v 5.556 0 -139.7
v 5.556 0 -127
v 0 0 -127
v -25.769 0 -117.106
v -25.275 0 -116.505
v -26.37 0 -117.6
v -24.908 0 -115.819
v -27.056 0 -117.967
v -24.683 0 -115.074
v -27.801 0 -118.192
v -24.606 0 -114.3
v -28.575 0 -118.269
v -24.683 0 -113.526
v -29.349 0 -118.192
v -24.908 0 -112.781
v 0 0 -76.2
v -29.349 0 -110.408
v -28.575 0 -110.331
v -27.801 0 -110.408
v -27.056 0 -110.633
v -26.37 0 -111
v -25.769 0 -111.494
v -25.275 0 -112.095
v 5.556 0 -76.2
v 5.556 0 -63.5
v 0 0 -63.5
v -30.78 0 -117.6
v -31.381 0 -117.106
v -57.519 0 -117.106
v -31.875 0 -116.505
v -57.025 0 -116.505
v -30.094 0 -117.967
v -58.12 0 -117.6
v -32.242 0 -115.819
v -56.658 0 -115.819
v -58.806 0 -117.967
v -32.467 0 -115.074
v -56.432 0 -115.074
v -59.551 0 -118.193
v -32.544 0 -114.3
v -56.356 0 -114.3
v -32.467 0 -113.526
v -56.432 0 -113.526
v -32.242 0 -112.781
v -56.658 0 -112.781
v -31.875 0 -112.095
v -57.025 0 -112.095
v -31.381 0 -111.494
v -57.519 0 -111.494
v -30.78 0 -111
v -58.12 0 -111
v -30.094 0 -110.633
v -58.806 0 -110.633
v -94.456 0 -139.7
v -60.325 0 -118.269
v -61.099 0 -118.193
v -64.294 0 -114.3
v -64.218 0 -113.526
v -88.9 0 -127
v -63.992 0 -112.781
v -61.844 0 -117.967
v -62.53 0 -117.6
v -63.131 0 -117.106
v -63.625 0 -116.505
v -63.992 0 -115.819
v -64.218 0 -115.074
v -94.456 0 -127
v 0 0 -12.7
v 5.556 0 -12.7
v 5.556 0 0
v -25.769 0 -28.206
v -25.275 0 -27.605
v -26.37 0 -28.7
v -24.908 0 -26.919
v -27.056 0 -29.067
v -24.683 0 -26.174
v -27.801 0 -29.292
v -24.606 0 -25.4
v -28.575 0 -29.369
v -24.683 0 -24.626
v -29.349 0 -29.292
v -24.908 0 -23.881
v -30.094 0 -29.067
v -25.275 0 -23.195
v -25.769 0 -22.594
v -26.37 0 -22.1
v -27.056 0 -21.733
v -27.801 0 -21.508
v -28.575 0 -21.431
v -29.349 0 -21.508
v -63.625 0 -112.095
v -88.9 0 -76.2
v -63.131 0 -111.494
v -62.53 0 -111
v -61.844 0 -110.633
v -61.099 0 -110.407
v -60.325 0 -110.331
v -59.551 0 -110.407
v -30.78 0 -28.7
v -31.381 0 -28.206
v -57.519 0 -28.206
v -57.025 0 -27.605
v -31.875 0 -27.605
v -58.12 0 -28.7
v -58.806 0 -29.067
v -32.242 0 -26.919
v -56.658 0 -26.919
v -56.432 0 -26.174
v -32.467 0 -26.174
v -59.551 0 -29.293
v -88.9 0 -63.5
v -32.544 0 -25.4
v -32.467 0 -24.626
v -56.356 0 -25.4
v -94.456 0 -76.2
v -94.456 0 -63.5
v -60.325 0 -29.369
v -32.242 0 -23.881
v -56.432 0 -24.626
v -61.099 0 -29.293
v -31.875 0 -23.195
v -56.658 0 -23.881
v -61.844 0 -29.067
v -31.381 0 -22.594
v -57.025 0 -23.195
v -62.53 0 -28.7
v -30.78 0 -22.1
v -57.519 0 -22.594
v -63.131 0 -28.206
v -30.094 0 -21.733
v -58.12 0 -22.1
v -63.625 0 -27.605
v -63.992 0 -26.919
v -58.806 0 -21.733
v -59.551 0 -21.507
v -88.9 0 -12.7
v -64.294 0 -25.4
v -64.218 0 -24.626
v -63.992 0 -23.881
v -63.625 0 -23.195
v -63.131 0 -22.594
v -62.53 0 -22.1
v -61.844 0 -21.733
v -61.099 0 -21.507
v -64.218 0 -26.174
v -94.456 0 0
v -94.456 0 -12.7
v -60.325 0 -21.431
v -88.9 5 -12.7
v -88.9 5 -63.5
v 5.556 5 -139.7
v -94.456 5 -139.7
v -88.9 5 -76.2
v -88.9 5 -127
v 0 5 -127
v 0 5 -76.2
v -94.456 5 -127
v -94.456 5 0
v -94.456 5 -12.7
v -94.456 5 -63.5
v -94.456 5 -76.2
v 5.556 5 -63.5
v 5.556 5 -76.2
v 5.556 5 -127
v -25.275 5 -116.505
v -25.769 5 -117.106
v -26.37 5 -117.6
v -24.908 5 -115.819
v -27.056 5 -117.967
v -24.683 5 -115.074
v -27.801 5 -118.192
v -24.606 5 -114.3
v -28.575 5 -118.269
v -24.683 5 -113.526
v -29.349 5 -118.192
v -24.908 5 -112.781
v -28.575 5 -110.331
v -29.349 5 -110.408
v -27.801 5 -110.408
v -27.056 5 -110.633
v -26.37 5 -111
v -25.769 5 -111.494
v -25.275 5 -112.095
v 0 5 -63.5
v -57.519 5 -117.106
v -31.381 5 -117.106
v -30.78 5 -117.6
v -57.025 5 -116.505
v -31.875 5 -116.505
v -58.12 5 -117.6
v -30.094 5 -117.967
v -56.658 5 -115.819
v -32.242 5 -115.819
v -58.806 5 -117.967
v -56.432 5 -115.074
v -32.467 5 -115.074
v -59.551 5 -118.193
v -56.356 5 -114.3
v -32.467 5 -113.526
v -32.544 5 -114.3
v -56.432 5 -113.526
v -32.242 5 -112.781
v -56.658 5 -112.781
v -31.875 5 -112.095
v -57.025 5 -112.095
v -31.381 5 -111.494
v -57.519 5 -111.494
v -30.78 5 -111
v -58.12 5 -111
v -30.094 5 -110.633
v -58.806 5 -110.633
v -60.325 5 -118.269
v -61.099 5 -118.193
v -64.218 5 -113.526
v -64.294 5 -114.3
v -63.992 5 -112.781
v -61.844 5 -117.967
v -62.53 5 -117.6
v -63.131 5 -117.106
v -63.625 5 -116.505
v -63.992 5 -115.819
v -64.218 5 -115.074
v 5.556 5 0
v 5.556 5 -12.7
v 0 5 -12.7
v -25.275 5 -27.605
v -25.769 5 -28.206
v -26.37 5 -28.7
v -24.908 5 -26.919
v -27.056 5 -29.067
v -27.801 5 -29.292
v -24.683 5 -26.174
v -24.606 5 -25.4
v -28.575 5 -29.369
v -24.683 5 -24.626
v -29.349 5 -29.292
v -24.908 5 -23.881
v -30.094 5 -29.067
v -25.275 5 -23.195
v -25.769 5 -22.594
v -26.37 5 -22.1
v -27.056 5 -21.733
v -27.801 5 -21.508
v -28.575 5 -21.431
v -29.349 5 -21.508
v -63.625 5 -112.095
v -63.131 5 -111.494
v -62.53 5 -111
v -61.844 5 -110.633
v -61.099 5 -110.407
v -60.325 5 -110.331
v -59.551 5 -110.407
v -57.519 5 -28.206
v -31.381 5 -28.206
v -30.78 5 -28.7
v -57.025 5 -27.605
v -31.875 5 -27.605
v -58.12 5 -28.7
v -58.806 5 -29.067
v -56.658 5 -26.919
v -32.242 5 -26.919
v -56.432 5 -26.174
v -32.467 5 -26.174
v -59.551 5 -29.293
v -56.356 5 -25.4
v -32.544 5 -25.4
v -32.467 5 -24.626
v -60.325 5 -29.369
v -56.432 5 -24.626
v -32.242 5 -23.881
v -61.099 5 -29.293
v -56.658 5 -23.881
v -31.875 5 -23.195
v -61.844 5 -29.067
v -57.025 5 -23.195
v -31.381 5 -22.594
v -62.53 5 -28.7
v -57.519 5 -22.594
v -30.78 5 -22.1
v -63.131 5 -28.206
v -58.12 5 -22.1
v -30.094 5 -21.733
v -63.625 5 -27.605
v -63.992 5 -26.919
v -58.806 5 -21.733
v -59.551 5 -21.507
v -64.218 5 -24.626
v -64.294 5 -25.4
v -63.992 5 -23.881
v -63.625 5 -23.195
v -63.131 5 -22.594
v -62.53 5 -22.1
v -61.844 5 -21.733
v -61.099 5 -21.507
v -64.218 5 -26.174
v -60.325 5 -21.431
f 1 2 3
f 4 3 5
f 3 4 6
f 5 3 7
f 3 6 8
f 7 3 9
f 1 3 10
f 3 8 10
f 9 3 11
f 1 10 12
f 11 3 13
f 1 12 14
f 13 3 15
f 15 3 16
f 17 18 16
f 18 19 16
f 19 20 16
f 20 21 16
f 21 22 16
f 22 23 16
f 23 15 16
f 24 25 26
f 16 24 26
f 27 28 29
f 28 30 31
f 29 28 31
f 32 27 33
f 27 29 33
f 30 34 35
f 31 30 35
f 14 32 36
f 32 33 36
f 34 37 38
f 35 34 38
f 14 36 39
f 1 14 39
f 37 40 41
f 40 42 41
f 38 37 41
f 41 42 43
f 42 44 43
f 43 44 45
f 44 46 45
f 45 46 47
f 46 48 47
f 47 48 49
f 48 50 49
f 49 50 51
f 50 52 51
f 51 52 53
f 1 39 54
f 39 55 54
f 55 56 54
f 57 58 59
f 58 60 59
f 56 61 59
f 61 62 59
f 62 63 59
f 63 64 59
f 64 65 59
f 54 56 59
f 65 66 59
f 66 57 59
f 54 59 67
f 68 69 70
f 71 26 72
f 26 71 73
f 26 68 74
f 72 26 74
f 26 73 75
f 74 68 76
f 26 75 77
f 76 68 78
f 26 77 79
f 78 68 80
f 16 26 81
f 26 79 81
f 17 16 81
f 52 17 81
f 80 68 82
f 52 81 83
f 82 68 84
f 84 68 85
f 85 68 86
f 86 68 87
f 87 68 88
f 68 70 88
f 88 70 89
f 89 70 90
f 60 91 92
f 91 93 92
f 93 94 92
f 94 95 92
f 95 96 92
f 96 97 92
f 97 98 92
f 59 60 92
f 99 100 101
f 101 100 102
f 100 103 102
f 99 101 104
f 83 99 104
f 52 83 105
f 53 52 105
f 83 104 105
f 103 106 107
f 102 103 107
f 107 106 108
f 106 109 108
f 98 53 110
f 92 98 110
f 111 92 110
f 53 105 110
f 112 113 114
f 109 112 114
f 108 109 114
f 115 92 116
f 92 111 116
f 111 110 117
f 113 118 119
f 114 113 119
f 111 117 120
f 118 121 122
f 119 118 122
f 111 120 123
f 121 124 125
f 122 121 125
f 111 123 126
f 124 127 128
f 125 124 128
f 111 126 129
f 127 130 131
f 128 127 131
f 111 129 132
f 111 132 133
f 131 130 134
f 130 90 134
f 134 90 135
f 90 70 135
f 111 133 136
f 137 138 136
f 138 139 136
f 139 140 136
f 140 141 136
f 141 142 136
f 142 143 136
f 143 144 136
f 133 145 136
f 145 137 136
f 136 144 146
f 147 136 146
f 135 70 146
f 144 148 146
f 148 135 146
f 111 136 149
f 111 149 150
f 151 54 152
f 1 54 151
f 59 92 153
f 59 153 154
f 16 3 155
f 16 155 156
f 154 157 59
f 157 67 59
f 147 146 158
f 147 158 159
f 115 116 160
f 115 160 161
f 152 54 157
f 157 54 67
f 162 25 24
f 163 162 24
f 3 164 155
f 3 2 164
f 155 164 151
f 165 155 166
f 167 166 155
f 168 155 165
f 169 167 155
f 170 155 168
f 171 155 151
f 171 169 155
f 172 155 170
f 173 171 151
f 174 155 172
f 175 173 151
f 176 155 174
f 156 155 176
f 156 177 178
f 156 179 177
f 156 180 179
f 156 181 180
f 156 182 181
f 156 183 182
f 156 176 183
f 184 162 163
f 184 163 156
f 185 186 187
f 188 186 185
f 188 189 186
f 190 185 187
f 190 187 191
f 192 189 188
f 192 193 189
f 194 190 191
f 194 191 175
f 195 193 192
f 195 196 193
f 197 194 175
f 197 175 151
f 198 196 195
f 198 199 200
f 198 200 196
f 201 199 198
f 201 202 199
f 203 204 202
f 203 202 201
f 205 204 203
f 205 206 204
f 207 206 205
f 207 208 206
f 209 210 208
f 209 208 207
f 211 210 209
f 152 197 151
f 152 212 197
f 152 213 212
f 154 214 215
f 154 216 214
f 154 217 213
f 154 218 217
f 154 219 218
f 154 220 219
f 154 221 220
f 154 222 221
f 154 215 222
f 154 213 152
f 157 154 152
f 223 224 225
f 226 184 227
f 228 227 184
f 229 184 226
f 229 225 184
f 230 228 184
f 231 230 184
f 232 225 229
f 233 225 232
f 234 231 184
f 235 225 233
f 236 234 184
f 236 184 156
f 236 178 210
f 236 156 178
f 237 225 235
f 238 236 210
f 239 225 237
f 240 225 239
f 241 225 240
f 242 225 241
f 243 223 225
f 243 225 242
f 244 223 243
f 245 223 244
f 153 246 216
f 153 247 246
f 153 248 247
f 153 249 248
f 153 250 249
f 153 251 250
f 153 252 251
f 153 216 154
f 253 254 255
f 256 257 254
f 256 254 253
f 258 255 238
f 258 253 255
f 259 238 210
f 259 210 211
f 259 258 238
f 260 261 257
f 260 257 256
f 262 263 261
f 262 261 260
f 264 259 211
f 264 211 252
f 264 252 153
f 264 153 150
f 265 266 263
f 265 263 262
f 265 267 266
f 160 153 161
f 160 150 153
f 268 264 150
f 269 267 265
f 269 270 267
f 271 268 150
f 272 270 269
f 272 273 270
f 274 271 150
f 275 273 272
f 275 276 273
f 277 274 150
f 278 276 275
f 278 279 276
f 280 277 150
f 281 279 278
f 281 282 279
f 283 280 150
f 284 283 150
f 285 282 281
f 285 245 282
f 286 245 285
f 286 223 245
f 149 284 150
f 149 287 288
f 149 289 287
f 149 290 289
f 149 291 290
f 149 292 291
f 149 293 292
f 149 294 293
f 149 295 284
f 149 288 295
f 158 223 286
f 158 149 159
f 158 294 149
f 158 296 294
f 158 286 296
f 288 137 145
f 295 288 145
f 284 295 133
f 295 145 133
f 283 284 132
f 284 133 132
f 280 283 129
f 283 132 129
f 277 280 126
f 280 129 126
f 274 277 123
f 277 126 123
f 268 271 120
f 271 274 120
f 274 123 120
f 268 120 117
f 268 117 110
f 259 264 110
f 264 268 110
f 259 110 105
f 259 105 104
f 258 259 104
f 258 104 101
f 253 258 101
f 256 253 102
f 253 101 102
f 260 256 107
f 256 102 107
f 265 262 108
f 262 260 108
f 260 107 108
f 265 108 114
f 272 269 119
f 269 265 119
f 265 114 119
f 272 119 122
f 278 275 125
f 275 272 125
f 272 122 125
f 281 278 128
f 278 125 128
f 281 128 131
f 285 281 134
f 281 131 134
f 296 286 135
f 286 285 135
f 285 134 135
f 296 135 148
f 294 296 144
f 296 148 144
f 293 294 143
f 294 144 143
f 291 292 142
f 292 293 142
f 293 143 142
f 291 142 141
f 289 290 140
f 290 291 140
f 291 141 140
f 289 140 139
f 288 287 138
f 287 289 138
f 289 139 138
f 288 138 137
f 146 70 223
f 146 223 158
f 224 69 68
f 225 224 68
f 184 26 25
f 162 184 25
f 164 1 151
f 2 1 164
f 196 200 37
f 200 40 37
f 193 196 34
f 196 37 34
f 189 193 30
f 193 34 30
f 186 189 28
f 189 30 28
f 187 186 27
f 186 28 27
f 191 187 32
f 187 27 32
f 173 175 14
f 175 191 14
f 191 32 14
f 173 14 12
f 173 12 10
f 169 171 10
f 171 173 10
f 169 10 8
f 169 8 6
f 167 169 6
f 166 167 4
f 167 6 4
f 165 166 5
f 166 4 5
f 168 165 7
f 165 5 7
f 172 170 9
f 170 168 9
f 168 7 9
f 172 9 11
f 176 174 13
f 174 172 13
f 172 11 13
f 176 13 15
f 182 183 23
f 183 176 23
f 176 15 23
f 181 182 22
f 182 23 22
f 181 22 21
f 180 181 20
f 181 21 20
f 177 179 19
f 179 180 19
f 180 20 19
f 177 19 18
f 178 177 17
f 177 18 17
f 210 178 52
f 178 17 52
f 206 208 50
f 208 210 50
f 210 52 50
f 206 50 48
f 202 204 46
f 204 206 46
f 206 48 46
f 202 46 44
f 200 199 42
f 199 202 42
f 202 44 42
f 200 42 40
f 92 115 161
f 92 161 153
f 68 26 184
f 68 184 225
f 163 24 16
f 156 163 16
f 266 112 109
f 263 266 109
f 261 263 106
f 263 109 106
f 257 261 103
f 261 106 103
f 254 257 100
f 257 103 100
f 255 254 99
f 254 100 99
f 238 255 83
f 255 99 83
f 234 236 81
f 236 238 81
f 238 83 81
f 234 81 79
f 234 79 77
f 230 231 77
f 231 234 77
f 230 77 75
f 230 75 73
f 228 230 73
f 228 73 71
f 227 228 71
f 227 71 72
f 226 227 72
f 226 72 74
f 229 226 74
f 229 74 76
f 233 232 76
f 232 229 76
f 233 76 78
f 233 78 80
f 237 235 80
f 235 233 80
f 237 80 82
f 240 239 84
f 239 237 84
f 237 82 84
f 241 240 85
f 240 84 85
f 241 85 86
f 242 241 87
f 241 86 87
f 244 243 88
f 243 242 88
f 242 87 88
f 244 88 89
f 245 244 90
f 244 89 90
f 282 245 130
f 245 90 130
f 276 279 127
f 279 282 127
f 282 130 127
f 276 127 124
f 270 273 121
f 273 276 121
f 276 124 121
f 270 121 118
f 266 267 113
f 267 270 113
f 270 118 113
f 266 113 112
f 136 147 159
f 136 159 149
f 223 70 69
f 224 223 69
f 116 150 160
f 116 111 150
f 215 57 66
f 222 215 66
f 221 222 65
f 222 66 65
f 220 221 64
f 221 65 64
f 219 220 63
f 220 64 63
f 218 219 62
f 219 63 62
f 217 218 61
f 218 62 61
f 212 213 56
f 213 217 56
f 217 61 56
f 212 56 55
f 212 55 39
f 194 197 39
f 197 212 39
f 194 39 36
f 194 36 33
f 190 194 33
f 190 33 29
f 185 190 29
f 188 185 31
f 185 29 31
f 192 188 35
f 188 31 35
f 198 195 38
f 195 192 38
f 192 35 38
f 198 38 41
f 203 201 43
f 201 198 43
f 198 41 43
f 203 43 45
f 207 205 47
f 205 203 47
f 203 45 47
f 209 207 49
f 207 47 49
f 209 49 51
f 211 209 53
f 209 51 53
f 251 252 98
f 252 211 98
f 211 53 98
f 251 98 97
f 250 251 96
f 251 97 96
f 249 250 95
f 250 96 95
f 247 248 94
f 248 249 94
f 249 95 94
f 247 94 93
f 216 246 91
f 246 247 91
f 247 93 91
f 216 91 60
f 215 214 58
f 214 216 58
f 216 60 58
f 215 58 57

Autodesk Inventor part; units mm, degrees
ref_plane "YZ Plane" through (0, 0, 0) normal (1, 0, 0) x (0, 1, 0)
ref_plane "XZ Plane" through (0, 0, 0) normal (0, 1, 0) x (-1, 0, 0)
ref_plane "XY Plane" through (0, 0, 0) normal (0, 0, 1) x (1, 0, 0)
sketch "Boceto1" plane through (0, 0, 0) normal (0, 1, 0) x (-1, 0, 0)
  line L0 (0, 0) -> (88.9, 0)
  line L1 (88.9, 0) -> (88.9, -139.7)
  line L2 (88.9, -139.7) -> (0, -139.7)
  line L3 (0, -139.7) -> (0, 0)
  circle A0 centre (60.325, -25.4) radius 3.9688
  circle A1 centre (60.325, -114.3) radius 3.9688
  circle A2 centre (28.575, -25.4) radius 3.9687
  circle A3 centre (28.575, -114.3) radius 3.9687
  line L4 (88.9, 0) -> (94.4562, 0)
  line L5 (94.4562, 0) -> (94.4562, -12.7)
  line L6 (94.4562, -12.7) -> (88.9, -12.7)
  line L7 (88.9, -12.7) -> (88.9, 0)
  line L8 (88.9, -139.7) -> (94.4563, -139.7)
  line L9 (94.4563, -139.7) -> (94.4563, -127)
  line L10 (94.4563, -127) -> (88.9, -127)
  line L11 (88.9, -127) -> (88.9, -139.7)
  line L12 (0, 0) -> (-5.5563, 0)
  line L13 (-5.5563, 0) -> (-5.5563, -12.7)
  line L14 (-5.5563, -12.7) -> (0, -12.7)
  line L15 (0, -12.7) -> (0, 0)
  line L16 (0, -139.7) -> (-5.5562, -139.7)
  line L17 (-5.5562, -139.7) -> (-5.5562, -127)
  line L18 (-5.5562, -127) -> (0, -127)
  line L19 (0, -127) -> (0, -139.7)
  line L20 (88.9, -63.5) -> (94.4562, -63.5)
  line L21 (94.4562, -63.5) -> (94.4562, -76.2)
  line L22 (94.4562, -76.2) -> (88.9, -76.2)
  line L23 (88.9, -76.2) -> (88.9, -63.5)
  line L24 (0, -63.5) -> (-5.5563, -63.5)
  line L25 (-5.5563, -63.5) -> (-5.5563, -76.2)
  line L26 (-5.5563, -76.2) -> (0, -76.2)
  line L27 (0, -76.2) -> (0, -63.5)
  dimension "d0" = 88.9
  dimension "d1" = 139.7
  dimension "d2" = 7.9375
  dimension "d3" = 7.9375
  dimension "d4" = 7.9375
  dimension "d5" = 7.9375
  dimension "d6" = 88.9
  dimension "d7" = 28.575
  dimension "d8" = 28.575
  dimension "d9" = 28.575
  dimension "d10" = 28.575
  dimension "d11" = 25.4
  dimension "d12" = 25.4
  dimension "d13" = 88.9
  dimension "d17" = 5.5563
  dimension "d18" = 12.7
  dimension "d19" = 5.5563
  dimension "d20" = 12.7
  dimension "d21" = 5.5563
  dimension "d22" = 12.7
  dimension "d23" = 5.5563
  dimension "d24" = 12.7
  dimension "d25" = 5.5563
  dimension "d26" = 12.7
  dimension "d27" = 5.5563
  dimension "d28" = 12.7
  dimension "d29" = 63.5
  dimension "d30" = 63.5
extrude "Extrusión1" add sketch "Boceto1" along normal blind 5
properties part number "CAR BOTTOM PLATE"
